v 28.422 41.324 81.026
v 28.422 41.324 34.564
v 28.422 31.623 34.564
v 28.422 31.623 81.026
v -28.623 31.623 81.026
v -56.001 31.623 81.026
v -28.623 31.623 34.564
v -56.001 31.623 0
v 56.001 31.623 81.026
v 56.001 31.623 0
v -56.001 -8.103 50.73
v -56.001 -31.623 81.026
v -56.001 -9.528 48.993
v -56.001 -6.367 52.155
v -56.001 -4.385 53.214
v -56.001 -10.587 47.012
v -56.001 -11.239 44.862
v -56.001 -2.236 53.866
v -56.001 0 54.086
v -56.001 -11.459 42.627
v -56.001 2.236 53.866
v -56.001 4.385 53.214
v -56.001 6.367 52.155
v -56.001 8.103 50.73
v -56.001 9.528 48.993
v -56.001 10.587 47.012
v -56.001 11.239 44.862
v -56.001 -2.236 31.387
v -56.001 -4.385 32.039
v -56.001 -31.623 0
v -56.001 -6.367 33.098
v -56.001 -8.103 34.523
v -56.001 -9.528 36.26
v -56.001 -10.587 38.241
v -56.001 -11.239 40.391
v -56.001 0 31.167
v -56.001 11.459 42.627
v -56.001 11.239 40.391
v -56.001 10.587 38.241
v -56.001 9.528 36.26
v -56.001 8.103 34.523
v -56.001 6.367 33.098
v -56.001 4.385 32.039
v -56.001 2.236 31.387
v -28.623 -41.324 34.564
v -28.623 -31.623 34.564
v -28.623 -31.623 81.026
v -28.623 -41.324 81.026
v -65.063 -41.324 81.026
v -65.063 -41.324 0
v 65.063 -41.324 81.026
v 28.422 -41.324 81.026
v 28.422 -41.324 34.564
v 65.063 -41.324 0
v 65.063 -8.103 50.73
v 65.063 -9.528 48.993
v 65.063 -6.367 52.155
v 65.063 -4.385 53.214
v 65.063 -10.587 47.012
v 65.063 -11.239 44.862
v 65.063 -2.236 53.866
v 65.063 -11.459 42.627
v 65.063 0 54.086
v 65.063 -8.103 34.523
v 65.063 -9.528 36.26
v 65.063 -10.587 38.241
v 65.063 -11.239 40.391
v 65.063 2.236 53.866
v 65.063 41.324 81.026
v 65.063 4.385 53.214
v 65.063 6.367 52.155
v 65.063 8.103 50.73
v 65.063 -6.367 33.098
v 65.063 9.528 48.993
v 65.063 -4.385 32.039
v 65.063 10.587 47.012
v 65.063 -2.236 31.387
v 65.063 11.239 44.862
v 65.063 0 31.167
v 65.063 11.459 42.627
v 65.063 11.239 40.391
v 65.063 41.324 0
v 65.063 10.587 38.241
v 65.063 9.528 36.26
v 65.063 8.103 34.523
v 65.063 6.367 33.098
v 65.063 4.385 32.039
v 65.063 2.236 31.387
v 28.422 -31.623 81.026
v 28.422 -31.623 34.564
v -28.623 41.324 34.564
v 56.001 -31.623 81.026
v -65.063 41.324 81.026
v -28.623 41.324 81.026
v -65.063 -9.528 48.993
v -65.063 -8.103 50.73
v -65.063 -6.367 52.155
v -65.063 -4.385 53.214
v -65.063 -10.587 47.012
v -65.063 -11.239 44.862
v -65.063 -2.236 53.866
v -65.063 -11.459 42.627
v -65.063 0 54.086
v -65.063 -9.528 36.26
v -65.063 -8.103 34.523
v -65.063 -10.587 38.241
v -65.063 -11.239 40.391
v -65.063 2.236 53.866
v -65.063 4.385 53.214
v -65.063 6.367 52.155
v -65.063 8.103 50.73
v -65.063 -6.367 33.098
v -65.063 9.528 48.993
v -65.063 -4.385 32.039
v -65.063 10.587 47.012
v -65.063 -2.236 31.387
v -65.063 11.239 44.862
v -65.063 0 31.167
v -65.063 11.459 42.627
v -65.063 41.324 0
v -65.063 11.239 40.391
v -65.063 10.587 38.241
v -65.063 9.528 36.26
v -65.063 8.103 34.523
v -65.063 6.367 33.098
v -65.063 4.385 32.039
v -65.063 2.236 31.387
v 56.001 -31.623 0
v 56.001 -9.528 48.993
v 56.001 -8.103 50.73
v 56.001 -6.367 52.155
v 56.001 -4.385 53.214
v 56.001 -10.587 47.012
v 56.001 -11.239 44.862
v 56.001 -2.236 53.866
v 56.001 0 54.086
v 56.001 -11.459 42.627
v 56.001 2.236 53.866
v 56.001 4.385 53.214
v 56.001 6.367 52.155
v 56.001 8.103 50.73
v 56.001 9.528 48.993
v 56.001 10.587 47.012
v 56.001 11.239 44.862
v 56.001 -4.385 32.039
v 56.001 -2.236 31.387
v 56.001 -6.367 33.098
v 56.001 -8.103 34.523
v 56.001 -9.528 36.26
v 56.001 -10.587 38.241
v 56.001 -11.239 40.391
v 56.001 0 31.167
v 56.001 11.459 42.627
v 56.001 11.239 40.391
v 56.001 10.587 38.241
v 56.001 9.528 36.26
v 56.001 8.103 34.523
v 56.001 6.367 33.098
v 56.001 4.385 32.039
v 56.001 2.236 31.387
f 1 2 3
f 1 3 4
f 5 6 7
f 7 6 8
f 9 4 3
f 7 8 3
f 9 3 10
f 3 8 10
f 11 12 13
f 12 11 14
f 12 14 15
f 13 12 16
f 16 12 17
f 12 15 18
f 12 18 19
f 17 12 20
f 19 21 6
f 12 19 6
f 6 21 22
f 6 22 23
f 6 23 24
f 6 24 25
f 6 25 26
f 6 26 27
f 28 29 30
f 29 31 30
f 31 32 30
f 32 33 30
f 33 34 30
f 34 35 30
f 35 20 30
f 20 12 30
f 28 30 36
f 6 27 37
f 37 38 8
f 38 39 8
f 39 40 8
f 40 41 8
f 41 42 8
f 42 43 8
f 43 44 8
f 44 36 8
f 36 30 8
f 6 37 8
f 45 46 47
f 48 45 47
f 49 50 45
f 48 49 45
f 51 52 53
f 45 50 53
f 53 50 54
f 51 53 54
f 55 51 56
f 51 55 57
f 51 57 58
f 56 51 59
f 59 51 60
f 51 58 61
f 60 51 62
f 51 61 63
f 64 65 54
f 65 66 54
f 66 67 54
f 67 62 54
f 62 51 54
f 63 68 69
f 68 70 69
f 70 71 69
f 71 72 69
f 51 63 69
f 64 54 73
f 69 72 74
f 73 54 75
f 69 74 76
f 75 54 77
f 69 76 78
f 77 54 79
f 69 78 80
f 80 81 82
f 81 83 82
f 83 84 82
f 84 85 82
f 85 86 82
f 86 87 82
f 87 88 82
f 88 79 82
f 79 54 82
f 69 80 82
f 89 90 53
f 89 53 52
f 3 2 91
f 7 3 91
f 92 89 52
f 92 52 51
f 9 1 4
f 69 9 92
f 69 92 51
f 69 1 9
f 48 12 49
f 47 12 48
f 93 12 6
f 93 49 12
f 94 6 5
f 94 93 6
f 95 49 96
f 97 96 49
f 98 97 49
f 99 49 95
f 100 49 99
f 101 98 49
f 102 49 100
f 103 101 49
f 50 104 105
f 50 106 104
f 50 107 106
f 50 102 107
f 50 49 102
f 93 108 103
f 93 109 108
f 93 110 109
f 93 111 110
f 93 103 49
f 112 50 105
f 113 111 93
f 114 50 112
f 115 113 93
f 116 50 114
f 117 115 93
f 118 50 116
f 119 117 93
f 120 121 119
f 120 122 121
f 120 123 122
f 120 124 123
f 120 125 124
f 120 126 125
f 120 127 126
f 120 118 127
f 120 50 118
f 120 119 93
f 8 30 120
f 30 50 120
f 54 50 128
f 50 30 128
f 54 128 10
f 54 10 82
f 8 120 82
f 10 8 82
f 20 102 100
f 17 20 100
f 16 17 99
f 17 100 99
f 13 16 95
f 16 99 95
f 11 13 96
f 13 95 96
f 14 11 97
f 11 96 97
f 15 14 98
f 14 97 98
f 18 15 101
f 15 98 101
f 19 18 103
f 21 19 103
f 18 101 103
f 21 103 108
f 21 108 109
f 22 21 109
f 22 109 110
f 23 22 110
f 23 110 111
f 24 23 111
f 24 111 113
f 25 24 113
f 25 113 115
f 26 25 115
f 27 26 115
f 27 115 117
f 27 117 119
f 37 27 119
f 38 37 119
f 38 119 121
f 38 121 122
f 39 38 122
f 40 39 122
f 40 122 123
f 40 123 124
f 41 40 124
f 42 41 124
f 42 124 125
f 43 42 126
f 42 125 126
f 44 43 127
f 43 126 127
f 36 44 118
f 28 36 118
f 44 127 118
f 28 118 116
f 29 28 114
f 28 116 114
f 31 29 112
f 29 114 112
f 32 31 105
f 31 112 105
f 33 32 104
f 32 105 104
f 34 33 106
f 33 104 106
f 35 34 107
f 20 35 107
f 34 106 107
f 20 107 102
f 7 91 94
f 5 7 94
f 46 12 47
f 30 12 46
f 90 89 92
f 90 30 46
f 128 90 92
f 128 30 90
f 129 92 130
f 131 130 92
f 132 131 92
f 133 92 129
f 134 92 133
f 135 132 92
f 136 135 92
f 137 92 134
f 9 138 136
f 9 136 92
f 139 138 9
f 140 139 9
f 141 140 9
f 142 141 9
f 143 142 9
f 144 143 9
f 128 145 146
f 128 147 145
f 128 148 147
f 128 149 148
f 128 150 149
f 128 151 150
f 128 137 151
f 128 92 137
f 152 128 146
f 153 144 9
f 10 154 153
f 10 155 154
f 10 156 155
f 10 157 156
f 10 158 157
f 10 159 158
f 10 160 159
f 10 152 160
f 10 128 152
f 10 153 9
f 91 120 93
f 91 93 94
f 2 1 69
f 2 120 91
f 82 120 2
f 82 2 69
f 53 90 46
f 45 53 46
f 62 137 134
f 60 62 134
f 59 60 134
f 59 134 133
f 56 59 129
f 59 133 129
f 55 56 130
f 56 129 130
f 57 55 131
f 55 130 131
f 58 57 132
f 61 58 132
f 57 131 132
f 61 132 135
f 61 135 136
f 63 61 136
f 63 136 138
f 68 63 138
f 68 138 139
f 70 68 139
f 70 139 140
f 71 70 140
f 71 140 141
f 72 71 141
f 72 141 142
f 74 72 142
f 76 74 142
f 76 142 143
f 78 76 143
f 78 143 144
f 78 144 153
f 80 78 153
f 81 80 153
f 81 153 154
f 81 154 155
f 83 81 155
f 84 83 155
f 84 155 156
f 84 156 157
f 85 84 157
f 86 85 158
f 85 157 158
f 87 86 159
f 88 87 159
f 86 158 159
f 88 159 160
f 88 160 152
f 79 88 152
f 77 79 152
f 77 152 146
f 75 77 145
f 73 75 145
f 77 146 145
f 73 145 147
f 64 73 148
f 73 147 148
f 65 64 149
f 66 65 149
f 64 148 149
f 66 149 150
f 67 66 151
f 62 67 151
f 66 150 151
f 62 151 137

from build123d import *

# Parameters (mm, degrees)
F1_W     = 130.1261633635
F1_H     = 82.6476961374
F1_W_2   = 112.0021492243
F1_H_2   = 63.2450655103
F2_DEPTH = 81.026
F3_W     = 57.0448189974
F3_H     = 46.4622946749
F4_DEPTH = 105.156
F5_R     = 11.4594947591
F6_DEPTH = 164.338


with BuildPart() as f2:
    # F1 (on face) → F2 (new body)
    with BuildSketch(Plane.XY):
        Rectangle(F1_W, F1_H)
        Rectangle(F1_W_2, F1_H_2, mode=Mode.SUBTRACT)
    extrude(amount=F2_DEPTH)

    # F3 (on face) → F4 (cut)
    with BuildSketch(Plane(origin=(0, 41.3238480687, 0), x_dir=(-1, 0, 0), z_dir=(0, 1, 0))):
        with Locations((0.1007858664, 57.7948526626)):
            Rectangle(F3_W, F3_H)
    extrude(amount=-F4_DEPTH, mode=Mode.SUBTRACT)

    # F5 (on face) → F6 (cut)
    with BuildSketch(Plane(origin=(-65.0630816817, 0, 0), x_dir=(0, -1, 0), z_dir=(-1, 0, 0))):
        with Locations((0, 42.6265746355)):
            Circle(F5_R)
    extrude(amount=-F6_DEPTH, mode=Mode.SUBTRACT)


solid = f2.part
